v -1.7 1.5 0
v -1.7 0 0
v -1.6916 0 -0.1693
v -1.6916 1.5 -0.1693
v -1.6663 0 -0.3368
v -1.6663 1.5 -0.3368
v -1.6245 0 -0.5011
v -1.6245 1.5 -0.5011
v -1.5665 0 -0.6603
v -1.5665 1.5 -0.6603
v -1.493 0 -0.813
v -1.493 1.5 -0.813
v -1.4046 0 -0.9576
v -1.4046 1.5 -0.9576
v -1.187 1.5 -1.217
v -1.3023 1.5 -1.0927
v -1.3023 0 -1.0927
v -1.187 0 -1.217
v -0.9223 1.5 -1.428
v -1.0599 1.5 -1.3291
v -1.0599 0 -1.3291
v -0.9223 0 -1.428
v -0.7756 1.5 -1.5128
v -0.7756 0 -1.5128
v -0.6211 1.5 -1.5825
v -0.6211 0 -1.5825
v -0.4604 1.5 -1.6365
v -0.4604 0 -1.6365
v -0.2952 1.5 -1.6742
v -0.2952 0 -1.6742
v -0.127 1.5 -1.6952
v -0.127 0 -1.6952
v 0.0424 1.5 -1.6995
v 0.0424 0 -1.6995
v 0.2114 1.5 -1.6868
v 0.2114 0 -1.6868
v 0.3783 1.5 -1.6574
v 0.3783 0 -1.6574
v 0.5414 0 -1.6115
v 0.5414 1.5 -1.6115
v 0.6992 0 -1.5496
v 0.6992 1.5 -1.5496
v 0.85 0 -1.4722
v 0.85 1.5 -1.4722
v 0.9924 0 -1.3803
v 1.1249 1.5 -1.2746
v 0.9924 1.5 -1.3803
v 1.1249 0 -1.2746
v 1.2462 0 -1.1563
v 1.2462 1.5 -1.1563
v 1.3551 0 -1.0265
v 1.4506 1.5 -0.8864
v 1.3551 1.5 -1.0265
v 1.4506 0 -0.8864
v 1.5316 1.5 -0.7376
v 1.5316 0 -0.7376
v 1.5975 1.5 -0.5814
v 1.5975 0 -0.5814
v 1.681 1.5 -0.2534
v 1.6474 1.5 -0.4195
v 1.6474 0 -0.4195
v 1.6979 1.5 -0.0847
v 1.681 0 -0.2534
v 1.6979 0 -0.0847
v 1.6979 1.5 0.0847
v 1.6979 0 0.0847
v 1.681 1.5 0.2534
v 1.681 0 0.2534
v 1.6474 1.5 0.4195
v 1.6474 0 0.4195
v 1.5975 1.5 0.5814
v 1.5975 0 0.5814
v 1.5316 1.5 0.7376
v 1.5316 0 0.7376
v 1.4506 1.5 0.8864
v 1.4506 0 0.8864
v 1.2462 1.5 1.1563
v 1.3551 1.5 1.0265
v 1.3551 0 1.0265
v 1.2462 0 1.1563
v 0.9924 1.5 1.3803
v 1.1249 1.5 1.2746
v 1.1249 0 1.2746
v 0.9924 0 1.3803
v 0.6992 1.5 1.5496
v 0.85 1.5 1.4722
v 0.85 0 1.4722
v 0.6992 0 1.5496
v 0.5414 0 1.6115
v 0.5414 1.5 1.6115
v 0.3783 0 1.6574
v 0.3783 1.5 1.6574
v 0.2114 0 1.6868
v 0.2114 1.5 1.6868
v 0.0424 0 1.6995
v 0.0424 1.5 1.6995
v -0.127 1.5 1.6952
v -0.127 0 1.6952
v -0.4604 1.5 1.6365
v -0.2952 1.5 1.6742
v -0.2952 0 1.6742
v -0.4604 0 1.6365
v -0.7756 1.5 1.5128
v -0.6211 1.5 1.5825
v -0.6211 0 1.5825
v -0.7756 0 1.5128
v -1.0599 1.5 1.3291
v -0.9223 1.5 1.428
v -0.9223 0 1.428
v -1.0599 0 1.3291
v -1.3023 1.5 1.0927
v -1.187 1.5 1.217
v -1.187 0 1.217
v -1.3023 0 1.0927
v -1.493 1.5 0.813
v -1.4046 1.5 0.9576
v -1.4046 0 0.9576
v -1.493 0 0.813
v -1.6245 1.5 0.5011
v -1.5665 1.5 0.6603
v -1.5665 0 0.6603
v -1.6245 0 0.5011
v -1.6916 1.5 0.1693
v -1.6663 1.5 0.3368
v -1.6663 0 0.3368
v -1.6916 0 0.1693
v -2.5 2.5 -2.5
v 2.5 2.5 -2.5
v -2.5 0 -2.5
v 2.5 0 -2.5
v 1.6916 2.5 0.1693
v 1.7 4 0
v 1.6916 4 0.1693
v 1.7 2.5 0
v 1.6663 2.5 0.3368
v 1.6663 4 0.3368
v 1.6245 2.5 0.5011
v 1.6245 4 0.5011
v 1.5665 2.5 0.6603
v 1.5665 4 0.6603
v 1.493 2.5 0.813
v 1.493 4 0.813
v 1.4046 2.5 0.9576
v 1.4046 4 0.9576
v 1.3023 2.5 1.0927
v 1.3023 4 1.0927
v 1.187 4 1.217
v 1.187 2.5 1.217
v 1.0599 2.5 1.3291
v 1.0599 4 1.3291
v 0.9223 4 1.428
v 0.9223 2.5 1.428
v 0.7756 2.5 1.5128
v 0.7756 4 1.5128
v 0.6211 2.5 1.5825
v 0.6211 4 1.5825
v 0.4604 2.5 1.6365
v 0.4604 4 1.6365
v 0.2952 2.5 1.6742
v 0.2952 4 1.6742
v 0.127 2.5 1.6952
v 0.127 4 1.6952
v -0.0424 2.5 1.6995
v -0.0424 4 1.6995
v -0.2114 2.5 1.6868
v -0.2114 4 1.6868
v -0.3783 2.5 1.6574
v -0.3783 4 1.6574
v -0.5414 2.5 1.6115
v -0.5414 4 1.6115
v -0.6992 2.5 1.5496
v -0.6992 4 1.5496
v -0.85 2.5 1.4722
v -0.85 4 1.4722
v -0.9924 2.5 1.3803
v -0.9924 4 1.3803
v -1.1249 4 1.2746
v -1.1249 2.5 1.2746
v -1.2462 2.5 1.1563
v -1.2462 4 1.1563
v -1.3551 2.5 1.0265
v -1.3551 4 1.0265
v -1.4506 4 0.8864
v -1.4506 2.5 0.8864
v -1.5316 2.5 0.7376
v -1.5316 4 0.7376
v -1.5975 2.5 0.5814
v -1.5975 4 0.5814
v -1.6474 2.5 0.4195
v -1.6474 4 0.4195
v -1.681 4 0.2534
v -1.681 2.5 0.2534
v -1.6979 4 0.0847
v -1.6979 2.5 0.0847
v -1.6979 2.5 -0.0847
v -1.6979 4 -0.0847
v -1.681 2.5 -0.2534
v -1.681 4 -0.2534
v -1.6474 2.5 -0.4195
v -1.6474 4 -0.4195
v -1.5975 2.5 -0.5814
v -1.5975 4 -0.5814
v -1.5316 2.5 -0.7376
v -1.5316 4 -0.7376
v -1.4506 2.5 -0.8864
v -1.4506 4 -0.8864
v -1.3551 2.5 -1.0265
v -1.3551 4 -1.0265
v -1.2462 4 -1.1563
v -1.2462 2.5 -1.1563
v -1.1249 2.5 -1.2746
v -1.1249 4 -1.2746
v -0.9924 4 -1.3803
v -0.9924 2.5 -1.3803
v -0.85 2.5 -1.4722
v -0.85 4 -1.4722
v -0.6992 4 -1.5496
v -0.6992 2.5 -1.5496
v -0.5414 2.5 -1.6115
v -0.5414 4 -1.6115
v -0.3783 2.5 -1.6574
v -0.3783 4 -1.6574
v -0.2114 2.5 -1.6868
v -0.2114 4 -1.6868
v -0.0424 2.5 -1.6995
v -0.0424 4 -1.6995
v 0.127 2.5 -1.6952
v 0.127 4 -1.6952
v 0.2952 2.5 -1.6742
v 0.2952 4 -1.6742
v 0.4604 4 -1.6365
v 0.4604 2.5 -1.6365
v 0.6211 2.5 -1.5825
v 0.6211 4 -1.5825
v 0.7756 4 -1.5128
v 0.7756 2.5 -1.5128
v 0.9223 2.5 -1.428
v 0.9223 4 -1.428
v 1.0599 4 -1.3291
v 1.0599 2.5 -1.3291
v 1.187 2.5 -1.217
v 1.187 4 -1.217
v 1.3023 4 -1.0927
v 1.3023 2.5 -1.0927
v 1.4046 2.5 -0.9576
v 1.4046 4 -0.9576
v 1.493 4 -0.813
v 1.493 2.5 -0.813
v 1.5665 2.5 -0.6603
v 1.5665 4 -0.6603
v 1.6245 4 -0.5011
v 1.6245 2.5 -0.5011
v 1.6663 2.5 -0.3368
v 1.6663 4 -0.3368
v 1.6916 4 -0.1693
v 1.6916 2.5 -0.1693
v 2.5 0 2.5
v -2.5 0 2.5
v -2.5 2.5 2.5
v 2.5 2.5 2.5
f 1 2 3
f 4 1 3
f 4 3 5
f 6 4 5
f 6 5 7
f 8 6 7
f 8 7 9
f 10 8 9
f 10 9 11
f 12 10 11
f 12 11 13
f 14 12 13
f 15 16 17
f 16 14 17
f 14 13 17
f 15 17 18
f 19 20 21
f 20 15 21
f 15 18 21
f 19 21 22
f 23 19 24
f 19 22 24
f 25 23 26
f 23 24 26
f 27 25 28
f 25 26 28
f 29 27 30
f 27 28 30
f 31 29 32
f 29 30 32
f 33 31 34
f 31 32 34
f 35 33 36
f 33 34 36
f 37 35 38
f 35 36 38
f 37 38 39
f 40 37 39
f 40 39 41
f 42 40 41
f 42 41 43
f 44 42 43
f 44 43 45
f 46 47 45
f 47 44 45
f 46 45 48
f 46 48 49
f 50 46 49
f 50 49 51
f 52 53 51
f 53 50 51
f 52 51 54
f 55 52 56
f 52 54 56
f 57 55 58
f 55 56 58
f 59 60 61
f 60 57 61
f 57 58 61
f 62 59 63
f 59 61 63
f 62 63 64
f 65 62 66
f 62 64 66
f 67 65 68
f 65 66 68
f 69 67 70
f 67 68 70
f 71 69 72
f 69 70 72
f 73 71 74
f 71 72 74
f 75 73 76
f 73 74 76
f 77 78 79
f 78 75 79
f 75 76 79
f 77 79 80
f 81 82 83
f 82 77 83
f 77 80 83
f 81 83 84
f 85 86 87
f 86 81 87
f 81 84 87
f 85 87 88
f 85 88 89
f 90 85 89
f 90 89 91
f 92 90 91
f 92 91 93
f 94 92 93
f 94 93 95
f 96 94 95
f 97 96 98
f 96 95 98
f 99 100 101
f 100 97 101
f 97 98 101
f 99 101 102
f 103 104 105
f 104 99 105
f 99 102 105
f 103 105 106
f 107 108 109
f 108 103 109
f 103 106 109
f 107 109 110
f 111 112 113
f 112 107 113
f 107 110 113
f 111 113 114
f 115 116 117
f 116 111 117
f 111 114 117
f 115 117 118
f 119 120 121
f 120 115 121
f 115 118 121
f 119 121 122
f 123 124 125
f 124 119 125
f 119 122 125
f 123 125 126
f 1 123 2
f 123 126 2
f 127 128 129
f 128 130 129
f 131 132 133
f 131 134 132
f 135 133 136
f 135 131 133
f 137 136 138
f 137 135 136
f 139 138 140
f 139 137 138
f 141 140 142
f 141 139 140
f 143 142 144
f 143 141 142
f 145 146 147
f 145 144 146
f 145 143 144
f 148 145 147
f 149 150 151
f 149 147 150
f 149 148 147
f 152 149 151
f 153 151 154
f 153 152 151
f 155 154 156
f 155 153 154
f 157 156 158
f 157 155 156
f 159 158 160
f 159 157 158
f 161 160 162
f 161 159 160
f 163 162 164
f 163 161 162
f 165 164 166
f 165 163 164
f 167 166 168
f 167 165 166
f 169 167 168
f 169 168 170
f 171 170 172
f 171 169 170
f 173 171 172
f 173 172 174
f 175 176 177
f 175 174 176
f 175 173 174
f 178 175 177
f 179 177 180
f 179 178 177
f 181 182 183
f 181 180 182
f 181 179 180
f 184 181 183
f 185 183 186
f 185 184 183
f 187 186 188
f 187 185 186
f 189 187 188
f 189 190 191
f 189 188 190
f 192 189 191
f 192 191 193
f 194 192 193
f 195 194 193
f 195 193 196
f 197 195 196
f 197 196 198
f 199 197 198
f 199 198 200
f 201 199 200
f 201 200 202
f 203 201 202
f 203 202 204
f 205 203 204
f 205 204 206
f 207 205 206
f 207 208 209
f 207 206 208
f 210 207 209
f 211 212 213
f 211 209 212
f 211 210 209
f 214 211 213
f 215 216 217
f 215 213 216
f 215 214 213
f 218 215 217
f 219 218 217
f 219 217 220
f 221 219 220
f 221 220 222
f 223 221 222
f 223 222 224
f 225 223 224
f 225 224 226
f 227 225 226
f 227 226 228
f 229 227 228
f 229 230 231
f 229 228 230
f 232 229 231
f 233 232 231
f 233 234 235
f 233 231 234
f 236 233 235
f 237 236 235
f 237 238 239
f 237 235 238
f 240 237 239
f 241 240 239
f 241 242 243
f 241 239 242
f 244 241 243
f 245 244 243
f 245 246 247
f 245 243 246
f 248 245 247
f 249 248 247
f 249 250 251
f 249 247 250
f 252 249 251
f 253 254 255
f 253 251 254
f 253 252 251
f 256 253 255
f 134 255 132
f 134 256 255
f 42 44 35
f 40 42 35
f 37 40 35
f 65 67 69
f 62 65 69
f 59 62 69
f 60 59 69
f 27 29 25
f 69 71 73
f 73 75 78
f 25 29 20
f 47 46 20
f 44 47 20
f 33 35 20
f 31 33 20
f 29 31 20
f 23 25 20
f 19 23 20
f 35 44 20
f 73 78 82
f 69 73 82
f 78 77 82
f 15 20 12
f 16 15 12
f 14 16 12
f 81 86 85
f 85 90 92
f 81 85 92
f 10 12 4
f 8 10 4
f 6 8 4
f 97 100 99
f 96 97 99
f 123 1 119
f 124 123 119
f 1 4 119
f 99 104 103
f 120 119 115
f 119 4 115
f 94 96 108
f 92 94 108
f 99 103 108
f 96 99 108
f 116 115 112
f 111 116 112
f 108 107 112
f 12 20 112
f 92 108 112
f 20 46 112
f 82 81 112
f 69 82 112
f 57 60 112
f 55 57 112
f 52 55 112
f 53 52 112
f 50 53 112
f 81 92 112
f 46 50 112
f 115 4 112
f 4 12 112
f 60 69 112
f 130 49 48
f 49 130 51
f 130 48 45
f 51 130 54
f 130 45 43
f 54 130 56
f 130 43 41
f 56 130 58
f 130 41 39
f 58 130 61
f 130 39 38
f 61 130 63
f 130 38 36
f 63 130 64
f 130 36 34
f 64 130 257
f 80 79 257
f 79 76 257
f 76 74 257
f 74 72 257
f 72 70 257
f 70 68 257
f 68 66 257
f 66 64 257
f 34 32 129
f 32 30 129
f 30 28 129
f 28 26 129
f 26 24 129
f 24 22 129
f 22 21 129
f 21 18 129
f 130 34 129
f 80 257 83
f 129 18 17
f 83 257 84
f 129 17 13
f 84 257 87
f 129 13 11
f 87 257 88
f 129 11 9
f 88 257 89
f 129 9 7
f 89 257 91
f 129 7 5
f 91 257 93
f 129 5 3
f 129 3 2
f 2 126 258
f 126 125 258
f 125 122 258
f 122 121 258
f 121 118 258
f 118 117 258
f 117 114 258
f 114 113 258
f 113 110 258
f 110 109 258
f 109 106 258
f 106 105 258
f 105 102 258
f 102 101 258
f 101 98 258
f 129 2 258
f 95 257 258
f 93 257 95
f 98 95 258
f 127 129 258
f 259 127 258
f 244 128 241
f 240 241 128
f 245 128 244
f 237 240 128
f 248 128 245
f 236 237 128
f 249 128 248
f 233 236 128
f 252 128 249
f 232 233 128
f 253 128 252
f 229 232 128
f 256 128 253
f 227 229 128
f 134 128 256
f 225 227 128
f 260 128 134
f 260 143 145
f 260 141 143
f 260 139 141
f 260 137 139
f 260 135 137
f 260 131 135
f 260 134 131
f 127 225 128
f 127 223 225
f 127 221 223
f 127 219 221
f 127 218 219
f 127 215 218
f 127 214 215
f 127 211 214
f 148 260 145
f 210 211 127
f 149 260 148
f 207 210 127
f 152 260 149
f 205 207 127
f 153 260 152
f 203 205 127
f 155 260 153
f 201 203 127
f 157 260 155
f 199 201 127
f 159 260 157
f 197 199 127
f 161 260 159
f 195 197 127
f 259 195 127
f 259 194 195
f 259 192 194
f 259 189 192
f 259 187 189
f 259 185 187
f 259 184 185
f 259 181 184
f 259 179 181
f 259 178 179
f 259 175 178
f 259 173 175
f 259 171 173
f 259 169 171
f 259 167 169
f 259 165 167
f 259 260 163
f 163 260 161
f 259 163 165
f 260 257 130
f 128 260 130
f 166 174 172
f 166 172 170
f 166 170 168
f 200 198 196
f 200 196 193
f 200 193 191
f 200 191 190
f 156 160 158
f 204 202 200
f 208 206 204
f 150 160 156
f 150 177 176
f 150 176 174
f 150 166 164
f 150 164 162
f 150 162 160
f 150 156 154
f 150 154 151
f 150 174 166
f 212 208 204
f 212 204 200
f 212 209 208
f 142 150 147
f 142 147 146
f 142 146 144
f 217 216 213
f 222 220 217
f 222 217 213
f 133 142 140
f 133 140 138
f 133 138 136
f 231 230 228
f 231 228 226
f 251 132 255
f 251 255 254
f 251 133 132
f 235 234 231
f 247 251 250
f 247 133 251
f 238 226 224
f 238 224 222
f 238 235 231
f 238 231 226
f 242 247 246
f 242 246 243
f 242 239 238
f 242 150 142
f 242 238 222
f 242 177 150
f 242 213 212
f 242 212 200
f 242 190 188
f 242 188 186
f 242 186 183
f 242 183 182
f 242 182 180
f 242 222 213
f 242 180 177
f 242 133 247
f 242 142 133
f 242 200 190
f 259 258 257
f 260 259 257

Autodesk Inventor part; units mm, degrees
ref_plane "YZ Plane" through (0, 0, 0) normal (1, 0, 0) x (0, 1, 0)
ref_plane "XZ Plane" through (0, 0, 0) normal (0, 1, 0) x (-1, 0, 0)
ref_plane "XY Plane" through (0, 0, 0) normal (0, 0, 1) x (1, 0, 0)
sketch "草圖1" plane through (0, 0, 0) normal (0, 1, 0) x (-1, 0, 0)
  line L0 (2.5, 2.5) -> (-2.5, 2.5)
  line L1 (-2.5, 2.5) -> (-2.5, -2.5)
  line L2 (-2.5, -2.5) -> (2.5, -2.5)
  line L3 (2.5, -2.5) -> (2.5, 2.5)
  circle A0 centre (0, 0) radius 1.7
  point P0 (2.5, 0)
  point P1 (0, -2.5)
  dimension "d0" = 5
  dimension "d1" = 5
  dimension "d4" = 3.4
extrude "擠出1" add sketch "草圖1" along normal blind 2.5 contours L3 L2 L1 L0 | A0
extrude "擠出2" cut sketch "草圖1" along normal blind 1.5 contours A0
sketch "草圖2" plane through (0, 2.5, 0) normal (0, 1, 0) x (1, 0, 0)
  circle A0 centre (0, 0) radius 1.7 projected
extrude "擠出3" add sketch "草圖2" along normal blind 1.5
properties part number "110033226_ipt_06_磚塊樺木(1x1)"
